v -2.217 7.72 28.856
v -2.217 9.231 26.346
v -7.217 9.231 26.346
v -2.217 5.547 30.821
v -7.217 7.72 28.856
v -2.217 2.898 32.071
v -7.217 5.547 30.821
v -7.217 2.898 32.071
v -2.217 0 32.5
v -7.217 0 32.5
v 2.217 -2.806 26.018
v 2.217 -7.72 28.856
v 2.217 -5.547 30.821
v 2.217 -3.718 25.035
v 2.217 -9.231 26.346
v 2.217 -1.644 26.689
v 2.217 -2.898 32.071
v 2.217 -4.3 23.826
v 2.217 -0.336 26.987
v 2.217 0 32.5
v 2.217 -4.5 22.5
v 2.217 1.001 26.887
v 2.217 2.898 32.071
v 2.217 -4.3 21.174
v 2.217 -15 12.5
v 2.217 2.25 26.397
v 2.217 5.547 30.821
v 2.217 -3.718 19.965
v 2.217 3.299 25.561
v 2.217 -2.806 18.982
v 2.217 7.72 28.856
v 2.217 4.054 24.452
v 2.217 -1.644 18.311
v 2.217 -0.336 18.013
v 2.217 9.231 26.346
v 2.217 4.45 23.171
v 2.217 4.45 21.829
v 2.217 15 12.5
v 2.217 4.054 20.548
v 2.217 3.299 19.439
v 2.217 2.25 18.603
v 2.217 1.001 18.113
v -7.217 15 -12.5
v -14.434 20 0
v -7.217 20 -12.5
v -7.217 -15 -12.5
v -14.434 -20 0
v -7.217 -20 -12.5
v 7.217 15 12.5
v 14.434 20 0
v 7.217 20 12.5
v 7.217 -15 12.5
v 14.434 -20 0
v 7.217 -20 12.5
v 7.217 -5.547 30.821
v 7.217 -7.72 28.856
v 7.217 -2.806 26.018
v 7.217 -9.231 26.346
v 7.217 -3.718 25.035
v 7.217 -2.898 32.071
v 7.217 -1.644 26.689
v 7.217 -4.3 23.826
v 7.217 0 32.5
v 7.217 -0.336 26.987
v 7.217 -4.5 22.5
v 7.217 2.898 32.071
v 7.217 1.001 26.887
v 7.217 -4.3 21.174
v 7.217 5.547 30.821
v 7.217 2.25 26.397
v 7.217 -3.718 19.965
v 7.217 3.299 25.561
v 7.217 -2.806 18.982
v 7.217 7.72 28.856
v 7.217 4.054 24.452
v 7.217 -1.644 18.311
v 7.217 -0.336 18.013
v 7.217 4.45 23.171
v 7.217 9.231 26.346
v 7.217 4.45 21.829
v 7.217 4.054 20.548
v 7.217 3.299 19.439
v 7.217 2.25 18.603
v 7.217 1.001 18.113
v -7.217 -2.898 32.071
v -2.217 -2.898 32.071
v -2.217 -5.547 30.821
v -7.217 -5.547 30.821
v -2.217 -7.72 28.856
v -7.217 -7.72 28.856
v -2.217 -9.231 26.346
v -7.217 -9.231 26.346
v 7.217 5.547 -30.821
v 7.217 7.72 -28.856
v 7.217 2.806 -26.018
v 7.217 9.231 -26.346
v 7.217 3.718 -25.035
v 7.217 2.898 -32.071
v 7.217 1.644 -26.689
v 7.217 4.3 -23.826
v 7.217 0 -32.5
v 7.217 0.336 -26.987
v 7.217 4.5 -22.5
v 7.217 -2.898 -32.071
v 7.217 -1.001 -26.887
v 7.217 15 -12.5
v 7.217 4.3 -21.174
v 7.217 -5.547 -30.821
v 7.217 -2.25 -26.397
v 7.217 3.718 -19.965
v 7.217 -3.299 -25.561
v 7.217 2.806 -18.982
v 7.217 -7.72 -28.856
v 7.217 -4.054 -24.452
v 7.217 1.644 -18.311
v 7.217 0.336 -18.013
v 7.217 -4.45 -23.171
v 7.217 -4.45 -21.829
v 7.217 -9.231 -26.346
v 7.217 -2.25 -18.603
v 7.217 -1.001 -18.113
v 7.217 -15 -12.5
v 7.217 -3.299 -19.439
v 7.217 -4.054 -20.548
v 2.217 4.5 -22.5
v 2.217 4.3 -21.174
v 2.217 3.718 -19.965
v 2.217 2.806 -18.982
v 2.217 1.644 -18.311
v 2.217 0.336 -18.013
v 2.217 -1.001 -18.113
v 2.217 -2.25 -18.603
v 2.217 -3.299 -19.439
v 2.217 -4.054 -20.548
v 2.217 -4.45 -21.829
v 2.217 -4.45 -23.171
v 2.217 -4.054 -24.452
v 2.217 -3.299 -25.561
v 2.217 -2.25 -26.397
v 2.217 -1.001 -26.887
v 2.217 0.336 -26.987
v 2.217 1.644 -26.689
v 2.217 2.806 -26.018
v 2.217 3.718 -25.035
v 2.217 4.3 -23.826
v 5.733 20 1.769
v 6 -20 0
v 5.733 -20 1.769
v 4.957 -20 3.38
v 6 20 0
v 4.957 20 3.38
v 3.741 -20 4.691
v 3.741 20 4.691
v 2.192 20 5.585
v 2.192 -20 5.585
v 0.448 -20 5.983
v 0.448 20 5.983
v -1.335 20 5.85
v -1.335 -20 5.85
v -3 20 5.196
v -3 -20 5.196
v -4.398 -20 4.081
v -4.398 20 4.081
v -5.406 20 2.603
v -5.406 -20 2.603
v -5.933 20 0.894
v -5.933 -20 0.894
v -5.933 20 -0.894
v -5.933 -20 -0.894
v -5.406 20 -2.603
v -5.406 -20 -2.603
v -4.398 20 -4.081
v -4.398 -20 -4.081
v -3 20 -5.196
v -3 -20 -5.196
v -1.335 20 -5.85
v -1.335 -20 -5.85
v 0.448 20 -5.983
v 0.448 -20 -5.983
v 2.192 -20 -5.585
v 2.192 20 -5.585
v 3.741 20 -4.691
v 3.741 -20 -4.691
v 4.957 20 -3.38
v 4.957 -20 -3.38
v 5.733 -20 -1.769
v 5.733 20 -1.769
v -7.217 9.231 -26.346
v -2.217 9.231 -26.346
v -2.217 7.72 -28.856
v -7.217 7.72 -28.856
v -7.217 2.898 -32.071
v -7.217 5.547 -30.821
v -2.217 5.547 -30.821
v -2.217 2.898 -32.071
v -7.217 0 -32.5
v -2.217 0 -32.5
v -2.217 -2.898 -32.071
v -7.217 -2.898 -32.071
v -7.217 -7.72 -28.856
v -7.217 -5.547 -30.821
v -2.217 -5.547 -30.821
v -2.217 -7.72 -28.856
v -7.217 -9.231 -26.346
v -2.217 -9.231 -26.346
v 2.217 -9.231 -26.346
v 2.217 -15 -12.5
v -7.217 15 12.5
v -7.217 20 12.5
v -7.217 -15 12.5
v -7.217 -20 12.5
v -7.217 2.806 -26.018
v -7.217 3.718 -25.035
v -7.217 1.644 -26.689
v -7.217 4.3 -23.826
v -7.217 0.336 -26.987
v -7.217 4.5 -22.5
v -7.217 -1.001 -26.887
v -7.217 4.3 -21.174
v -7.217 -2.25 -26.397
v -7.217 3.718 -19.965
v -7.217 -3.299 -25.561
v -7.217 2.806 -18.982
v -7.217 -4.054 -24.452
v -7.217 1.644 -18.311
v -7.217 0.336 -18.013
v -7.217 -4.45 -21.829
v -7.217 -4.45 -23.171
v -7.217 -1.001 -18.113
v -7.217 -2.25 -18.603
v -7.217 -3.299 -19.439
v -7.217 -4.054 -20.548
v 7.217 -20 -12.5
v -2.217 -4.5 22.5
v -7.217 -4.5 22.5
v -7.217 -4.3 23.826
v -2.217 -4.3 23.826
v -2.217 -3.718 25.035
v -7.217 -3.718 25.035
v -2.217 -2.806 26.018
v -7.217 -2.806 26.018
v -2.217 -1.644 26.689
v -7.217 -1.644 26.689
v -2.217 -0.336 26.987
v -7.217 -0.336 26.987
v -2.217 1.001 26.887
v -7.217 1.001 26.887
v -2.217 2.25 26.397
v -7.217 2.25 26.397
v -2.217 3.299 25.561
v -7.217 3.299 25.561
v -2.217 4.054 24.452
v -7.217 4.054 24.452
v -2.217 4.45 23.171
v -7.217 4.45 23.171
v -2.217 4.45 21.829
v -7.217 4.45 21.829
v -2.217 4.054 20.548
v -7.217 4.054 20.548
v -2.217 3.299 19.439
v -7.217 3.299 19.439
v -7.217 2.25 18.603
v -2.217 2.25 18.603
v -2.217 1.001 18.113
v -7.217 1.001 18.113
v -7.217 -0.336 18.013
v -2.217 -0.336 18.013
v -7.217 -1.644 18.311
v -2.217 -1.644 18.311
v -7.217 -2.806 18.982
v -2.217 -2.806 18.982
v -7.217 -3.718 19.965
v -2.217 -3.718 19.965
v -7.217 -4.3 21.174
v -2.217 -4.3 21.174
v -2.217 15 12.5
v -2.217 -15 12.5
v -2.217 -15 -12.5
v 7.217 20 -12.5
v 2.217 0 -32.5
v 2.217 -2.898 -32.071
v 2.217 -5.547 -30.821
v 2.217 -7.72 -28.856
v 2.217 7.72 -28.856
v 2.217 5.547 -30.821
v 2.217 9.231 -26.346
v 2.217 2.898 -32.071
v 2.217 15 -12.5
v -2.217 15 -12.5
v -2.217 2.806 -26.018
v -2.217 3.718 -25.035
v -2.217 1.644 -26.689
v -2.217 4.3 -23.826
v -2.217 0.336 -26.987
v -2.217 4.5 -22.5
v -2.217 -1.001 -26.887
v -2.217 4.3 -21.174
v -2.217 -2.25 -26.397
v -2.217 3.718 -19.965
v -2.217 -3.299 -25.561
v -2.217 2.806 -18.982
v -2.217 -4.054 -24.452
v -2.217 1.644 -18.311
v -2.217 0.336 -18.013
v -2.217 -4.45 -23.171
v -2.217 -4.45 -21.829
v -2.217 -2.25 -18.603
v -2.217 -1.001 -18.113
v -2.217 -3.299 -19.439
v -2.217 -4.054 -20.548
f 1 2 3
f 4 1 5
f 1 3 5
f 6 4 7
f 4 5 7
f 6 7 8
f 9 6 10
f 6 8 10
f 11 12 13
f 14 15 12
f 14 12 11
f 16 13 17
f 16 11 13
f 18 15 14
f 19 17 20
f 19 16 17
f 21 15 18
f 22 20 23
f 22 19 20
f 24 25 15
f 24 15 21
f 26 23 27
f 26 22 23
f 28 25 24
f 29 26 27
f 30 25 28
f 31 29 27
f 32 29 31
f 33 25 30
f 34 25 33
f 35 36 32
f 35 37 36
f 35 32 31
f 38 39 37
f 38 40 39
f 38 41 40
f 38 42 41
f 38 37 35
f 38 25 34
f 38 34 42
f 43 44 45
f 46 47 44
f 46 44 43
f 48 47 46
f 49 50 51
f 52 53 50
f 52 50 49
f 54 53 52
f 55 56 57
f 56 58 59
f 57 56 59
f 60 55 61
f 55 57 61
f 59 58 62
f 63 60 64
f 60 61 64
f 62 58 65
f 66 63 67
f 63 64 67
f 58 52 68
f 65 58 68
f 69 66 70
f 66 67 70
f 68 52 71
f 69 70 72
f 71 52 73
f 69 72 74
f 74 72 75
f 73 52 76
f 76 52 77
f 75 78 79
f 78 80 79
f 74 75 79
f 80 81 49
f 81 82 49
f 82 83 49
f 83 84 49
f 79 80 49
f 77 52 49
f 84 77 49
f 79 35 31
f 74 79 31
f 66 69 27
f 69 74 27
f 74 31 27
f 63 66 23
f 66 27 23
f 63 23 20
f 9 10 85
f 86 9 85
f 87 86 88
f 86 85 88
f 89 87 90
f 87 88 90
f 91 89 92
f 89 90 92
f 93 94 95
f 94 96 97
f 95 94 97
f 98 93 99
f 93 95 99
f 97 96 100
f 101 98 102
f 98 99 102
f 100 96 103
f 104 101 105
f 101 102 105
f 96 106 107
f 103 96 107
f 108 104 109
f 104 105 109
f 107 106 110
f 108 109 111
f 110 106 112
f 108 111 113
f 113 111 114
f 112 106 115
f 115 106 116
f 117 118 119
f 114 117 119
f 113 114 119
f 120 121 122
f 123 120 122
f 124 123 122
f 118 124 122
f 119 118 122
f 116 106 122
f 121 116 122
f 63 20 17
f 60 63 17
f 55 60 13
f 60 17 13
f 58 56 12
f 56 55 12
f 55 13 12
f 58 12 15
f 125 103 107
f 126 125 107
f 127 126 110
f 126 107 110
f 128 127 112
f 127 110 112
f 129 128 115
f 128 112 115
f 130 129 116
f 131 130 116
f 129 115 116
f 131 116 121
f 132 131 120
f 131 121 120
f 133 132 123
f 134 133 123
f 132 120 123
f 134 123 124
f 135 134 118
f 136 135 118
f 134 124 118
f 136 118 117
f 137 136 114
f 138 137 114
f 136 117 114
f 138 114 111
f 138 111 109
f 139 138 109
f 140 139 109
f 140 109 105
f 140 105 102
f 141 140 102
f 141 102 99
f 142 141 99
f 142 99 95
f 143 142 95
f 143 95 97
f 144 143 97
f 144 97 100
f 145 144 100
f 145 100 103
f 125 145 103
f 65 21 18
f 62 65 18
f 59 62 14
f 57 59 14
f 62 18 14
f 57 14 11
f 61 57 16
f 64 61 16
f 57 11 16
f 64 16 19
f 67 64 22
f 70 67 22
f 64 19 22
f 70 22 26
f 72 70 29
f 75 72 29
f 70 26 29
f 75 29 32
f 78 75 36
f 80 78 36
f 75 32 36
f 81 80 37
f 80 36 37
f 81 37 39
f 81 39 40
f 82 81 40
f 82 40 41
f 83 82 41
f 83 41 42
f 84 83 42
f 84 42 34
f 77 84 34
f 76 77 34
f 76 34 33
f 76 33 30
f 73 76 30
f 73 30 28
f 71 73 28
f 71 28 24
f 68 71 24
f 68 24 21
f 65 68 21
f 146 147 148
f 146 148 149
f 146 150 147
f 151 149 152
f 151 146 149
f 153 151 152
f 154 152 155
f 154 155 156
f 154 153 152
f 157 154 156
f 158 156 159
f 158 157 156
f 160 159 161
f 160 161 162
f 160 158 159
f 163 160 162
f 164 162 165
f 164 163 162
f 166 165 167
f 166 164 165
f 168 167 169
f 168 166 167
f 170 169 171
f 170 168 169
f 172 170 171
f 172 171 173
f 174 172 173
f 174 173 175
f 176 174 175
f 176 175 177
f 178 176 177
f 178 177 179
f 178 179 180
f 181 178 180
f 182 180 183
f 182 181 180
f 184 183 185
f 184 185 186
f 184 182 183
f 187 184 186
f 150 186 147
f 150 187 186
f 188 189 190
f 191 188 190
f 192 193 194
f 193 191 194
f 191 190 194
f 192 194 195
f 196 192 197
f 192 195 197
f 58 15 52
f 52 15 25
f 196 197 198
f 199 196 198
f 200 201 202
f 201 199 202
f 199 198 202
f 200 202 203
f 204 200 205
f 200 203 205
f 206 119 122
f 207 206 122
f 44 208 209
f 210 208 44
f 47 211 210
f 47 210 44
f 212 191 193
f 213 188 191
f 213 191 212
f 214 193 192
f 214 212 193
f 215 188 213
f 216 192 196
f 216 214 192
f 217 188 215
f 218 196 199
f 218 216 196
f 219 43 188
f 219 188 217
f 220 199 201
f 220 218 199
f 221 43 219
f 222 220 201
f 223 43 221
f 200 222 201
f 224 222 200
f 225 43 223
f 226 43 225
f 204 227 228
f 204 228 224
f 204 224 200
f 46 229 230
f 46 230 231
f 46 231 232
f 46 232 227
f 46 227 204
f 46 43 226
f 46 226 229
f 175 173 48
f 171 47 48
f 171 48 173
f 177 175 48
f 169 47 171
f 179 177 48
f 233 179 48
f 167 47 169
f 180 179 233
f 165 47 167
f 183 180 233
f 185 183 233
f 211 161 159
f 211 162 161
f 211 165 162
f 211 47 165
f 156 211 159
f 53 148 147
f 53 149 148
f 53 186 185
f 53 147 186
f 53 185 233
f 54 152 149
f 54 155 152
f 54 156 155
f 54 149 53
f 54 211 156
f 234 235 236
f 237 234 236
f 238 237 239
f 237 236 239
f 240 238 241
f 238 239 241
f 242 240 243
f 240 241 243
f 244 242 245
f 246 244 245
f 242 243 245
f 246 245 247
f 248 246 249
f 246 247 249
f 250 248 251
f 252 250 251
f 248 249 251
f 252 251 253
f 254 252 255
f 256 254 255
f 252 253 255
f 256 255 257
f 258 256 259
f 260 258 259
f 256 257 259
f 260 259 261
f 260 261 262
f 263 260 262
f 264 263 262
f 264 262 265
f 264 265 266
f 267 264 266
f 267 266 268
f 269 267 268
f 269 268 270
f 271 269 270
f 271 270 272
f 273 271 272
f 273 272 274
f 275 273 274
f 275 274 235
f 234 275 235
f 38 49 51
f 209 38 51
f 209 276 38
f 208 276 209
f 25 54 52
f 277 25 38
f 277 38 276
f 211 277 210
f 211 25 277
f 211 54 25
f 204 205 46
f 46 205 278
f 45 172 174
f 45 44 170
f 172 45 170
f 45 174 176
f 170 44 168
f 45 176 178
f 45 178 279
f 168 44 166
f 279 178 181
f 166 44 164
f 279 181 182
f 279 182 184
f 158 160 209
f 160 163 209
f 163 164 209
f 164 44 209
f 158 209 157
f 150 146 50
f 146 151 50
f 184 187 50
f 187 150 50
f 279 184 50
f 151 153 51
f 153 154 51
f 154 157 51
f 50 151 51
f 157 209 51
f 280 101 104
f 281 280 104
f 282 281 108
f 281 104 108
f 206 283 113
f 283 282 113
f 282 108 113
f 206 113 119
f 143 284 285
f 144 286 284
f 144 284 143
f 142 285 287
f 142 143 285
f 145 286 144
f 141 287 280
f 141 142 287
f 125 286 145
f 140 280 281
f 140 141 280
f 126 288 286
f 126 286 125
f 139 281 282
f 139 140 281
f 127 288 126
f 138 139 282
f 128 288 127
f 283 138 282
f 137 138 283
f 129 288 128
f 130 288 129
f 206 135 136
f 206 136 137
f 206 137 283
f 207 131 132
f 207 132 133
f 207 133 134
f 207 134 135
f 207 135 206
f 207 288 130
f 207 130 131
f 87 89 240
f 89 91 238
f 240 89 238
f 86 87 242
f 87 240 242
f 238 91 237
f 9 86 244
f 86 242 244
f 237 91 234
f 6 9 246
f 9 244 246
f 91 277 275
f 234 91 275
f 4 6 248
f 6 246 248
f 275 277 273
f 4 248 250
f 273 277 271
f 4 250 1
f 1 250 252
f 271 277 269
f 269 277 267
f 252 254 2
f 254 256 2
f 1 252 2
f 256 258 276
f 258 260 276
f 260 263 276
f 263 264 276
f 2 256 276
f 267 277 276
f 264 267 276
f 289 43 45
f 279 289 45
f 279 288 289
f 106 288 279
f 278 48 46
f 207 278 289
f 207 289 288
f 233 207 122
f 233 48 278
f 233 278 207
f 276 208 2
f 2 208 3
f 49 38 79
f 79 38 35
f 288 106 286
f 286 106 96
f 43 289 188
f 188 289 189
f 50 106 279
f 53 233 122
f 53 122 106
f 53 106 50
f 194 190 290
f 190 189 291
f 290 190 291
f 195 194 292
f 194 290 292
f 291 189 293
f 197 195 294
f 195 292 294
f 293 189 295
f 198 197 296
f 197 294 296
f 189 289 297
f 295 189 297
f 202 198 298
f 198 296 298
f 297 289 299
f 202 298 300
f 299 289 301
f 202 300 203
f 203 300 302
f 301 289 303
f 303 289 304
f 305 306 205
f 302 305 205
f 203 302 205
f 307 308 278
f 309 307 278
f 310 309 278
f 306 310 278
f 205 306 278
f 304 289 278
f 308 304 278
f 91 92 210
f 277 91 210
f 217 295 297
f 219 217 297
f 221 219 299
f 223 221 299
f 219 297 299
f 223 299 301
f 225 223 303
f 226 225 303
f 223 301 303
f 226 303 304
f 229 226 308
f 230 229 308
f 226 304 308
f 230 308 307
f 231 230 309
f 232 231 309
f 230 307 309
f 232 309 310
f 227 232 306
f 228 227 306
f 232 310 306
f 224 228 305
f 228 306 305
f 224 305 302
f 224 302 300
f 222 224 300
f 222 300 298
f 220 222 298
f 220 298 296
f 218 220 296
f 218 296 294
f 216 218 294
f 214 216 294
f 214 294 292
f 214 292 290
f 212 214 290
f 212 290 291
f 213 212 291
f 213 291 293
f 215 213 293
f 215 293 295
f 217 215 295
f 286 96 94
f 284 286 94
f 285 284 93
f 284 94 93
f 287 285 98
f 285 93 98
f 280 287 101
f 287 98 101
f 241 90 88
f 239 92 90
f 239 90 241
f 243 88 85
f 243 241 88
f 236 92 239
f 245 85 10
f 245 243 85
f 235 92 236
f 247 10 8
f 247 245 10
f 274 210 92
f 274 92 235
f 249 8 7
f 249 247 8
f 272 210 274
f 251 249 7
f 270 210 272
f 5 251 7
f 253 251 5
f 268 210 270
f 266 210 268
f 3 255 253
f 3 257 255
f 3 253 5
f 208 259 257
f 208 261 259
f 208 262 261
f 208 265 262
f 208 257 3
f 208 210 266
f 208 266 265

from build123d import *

# Parameters (mm, degrees)
F0_R      = 6
F1_DEPTH  = 20
F2_W      = 14.4337567297
F2_H      = 30
F3_DEPTH  = 20
F4_R      = 4.5
F5_DEPTH  = 21.6516350946
F7_DEPTH  = 25.4
F8_W      = 4.4337567297
F8_H      = 40
F9_DEPTH  = 25.4
F10_W     = 14.4337567297
F10_H     = 30
F11_DEPTH = 20
F12_R     = 4.5
F13_DEPTH = 25.4
F15_DEPTH = 25.4
F16_W     = 4.4337567297
F16_H     = 40
F17_DEPTH = 25.4


with BuildPart() as f1:
    # F0 (on Front) → F1 (new body, symmetric)
    with BuildSketch(Plane.XZ):
        Polygon((7.2168783649, 12.5), (-7.2168783649, 12.5), (-14.4337567297, 0), (-7.2168783649, -12.5), (7.2168783649, -12.5), (14.4337567297, 0), align=None)
        Circle(F0_R, mode=Mode.SUBTRACT)
    extrude(amount=F1_DEPTH, both=True)

    # F2 (on face) → F3 (join)
    with BuildSketch(Plane.XY.offset(12.5)):
        Rectangle(F2_W, F2_H)
    extrude(amount=F3_DEPTH)

    # F4 (on face) → F5 (cut, through all)
    with BuildSketch(Plane(origin=(-7.2168783649, 0, 0), x_dir=(0, -1, 0), z_dir=(-1, 0, 0))):
        with Locations((0, 22.5)):
            Circle(F4_R)
    extrude(amount=-F5_DEPTH, mode=Mode.SUBTRACT)

    # F6 (on face) → F7 (cut)
    with BuildSketch(Plane(origin=(-7.2168783649, 0, 0), x_dir=(0, -1, 0), z_dir=(-1, 0, 0))):
        with BuildLine():
            Line((-15, 32.5), (-15, 12.5))
            Line((-15, 12.5), (-9.2307692308, 26.3461538462))
            ThreePointArc((-9.2307692308, 26.3461538462), (-5.5470019623, 30.8205029434), (0, 32.5))
            Line((0, 32.5), (-15, 32.5))
        make_face()
        with BuildLine():
            Line((9.2307692308, 26.3461538462), (15, 12.5))
            Line((15, 12.5), (15, 32.5))
            Line((15, 32.5), (0, 32.5))
            ThreePointArc((0, 32.5), (5.5470019623, 30.8205029434), (9.2307692308, 26.3461538462))
        make_face()
    extrude(amount=-F7_DEPTH, mode=Mode.SUBTRACT)

    # F8 (on face) → F9 (cut)
    with BuildSketch(Plane.XY.offset(12.5)):
        Rectangle(F8_W, F8_H)
    extrude(amount=F9_DEPTH, mode=Mode.SUBTRACT)

    # F10 (on face) → F11 (join)
    with BuildSketch(Plane(origin=(0, 0, -12.5), x_dir=(1, 0, 0), z_dir=(0, 0, -1))):
        Rectangle(F10_W, F10_H)
    extrude(amount=F11_DEPTH)

    # F12 (on face) → F13 (cut)
    with BuildSketch(Plane.YZ.offset(7.2168783649)):
        with Locations((0, -22.5)):
            Circle(F12_R)
    extrude(amount=-F13_DEPTH, mode=Mode.SUBTRACT)

    # F14 (on face) → F15 (cut)
    with BuildSketch(Plane.YZ.offset(7.2168783649)):
        with BuildLine():
            Line((15, -32.5), (15, -12.5))
            Line((15, -12.5), (9.2307692308, -26.3461538462))
            ThreePointArc((9.2307692308, -26.3461538462), (5.5470019443, -30.8205029554), (-4.32e-08, -32.5))
            Line((-4.32e-08, -32.5), (15, -32.5))
        make_face()
        with BuildLine():
            Line((-9.2307692308, -26.3461538462), (-15, -12.5))
            Line((-15, -12.5), (-15, -32.5))
            Line((-15, -32.5), (-4.32e-08, -32.5))
            ThreePointArc((-4.32e-08, -32.5), (-5.5470019802, -30.8205029314), (-9.2307692308, -26.3461538462))
        make_face()
    extrude(amount=-F15_DEPTH, mode=Mode.SUBTRACT)

    # F16 (on face) → F17 (cut)
    with BuildSketch(Plane(origin=(0, 0, -12.5), x_dir=(1, 0, 0), z_dir=(0, 0, -1))):
        Rectangle(F16_W, F16_H)
    extrude(amount=F17_DEPTH, mode=Mode.SUBTRACT)


solid = f1.part
